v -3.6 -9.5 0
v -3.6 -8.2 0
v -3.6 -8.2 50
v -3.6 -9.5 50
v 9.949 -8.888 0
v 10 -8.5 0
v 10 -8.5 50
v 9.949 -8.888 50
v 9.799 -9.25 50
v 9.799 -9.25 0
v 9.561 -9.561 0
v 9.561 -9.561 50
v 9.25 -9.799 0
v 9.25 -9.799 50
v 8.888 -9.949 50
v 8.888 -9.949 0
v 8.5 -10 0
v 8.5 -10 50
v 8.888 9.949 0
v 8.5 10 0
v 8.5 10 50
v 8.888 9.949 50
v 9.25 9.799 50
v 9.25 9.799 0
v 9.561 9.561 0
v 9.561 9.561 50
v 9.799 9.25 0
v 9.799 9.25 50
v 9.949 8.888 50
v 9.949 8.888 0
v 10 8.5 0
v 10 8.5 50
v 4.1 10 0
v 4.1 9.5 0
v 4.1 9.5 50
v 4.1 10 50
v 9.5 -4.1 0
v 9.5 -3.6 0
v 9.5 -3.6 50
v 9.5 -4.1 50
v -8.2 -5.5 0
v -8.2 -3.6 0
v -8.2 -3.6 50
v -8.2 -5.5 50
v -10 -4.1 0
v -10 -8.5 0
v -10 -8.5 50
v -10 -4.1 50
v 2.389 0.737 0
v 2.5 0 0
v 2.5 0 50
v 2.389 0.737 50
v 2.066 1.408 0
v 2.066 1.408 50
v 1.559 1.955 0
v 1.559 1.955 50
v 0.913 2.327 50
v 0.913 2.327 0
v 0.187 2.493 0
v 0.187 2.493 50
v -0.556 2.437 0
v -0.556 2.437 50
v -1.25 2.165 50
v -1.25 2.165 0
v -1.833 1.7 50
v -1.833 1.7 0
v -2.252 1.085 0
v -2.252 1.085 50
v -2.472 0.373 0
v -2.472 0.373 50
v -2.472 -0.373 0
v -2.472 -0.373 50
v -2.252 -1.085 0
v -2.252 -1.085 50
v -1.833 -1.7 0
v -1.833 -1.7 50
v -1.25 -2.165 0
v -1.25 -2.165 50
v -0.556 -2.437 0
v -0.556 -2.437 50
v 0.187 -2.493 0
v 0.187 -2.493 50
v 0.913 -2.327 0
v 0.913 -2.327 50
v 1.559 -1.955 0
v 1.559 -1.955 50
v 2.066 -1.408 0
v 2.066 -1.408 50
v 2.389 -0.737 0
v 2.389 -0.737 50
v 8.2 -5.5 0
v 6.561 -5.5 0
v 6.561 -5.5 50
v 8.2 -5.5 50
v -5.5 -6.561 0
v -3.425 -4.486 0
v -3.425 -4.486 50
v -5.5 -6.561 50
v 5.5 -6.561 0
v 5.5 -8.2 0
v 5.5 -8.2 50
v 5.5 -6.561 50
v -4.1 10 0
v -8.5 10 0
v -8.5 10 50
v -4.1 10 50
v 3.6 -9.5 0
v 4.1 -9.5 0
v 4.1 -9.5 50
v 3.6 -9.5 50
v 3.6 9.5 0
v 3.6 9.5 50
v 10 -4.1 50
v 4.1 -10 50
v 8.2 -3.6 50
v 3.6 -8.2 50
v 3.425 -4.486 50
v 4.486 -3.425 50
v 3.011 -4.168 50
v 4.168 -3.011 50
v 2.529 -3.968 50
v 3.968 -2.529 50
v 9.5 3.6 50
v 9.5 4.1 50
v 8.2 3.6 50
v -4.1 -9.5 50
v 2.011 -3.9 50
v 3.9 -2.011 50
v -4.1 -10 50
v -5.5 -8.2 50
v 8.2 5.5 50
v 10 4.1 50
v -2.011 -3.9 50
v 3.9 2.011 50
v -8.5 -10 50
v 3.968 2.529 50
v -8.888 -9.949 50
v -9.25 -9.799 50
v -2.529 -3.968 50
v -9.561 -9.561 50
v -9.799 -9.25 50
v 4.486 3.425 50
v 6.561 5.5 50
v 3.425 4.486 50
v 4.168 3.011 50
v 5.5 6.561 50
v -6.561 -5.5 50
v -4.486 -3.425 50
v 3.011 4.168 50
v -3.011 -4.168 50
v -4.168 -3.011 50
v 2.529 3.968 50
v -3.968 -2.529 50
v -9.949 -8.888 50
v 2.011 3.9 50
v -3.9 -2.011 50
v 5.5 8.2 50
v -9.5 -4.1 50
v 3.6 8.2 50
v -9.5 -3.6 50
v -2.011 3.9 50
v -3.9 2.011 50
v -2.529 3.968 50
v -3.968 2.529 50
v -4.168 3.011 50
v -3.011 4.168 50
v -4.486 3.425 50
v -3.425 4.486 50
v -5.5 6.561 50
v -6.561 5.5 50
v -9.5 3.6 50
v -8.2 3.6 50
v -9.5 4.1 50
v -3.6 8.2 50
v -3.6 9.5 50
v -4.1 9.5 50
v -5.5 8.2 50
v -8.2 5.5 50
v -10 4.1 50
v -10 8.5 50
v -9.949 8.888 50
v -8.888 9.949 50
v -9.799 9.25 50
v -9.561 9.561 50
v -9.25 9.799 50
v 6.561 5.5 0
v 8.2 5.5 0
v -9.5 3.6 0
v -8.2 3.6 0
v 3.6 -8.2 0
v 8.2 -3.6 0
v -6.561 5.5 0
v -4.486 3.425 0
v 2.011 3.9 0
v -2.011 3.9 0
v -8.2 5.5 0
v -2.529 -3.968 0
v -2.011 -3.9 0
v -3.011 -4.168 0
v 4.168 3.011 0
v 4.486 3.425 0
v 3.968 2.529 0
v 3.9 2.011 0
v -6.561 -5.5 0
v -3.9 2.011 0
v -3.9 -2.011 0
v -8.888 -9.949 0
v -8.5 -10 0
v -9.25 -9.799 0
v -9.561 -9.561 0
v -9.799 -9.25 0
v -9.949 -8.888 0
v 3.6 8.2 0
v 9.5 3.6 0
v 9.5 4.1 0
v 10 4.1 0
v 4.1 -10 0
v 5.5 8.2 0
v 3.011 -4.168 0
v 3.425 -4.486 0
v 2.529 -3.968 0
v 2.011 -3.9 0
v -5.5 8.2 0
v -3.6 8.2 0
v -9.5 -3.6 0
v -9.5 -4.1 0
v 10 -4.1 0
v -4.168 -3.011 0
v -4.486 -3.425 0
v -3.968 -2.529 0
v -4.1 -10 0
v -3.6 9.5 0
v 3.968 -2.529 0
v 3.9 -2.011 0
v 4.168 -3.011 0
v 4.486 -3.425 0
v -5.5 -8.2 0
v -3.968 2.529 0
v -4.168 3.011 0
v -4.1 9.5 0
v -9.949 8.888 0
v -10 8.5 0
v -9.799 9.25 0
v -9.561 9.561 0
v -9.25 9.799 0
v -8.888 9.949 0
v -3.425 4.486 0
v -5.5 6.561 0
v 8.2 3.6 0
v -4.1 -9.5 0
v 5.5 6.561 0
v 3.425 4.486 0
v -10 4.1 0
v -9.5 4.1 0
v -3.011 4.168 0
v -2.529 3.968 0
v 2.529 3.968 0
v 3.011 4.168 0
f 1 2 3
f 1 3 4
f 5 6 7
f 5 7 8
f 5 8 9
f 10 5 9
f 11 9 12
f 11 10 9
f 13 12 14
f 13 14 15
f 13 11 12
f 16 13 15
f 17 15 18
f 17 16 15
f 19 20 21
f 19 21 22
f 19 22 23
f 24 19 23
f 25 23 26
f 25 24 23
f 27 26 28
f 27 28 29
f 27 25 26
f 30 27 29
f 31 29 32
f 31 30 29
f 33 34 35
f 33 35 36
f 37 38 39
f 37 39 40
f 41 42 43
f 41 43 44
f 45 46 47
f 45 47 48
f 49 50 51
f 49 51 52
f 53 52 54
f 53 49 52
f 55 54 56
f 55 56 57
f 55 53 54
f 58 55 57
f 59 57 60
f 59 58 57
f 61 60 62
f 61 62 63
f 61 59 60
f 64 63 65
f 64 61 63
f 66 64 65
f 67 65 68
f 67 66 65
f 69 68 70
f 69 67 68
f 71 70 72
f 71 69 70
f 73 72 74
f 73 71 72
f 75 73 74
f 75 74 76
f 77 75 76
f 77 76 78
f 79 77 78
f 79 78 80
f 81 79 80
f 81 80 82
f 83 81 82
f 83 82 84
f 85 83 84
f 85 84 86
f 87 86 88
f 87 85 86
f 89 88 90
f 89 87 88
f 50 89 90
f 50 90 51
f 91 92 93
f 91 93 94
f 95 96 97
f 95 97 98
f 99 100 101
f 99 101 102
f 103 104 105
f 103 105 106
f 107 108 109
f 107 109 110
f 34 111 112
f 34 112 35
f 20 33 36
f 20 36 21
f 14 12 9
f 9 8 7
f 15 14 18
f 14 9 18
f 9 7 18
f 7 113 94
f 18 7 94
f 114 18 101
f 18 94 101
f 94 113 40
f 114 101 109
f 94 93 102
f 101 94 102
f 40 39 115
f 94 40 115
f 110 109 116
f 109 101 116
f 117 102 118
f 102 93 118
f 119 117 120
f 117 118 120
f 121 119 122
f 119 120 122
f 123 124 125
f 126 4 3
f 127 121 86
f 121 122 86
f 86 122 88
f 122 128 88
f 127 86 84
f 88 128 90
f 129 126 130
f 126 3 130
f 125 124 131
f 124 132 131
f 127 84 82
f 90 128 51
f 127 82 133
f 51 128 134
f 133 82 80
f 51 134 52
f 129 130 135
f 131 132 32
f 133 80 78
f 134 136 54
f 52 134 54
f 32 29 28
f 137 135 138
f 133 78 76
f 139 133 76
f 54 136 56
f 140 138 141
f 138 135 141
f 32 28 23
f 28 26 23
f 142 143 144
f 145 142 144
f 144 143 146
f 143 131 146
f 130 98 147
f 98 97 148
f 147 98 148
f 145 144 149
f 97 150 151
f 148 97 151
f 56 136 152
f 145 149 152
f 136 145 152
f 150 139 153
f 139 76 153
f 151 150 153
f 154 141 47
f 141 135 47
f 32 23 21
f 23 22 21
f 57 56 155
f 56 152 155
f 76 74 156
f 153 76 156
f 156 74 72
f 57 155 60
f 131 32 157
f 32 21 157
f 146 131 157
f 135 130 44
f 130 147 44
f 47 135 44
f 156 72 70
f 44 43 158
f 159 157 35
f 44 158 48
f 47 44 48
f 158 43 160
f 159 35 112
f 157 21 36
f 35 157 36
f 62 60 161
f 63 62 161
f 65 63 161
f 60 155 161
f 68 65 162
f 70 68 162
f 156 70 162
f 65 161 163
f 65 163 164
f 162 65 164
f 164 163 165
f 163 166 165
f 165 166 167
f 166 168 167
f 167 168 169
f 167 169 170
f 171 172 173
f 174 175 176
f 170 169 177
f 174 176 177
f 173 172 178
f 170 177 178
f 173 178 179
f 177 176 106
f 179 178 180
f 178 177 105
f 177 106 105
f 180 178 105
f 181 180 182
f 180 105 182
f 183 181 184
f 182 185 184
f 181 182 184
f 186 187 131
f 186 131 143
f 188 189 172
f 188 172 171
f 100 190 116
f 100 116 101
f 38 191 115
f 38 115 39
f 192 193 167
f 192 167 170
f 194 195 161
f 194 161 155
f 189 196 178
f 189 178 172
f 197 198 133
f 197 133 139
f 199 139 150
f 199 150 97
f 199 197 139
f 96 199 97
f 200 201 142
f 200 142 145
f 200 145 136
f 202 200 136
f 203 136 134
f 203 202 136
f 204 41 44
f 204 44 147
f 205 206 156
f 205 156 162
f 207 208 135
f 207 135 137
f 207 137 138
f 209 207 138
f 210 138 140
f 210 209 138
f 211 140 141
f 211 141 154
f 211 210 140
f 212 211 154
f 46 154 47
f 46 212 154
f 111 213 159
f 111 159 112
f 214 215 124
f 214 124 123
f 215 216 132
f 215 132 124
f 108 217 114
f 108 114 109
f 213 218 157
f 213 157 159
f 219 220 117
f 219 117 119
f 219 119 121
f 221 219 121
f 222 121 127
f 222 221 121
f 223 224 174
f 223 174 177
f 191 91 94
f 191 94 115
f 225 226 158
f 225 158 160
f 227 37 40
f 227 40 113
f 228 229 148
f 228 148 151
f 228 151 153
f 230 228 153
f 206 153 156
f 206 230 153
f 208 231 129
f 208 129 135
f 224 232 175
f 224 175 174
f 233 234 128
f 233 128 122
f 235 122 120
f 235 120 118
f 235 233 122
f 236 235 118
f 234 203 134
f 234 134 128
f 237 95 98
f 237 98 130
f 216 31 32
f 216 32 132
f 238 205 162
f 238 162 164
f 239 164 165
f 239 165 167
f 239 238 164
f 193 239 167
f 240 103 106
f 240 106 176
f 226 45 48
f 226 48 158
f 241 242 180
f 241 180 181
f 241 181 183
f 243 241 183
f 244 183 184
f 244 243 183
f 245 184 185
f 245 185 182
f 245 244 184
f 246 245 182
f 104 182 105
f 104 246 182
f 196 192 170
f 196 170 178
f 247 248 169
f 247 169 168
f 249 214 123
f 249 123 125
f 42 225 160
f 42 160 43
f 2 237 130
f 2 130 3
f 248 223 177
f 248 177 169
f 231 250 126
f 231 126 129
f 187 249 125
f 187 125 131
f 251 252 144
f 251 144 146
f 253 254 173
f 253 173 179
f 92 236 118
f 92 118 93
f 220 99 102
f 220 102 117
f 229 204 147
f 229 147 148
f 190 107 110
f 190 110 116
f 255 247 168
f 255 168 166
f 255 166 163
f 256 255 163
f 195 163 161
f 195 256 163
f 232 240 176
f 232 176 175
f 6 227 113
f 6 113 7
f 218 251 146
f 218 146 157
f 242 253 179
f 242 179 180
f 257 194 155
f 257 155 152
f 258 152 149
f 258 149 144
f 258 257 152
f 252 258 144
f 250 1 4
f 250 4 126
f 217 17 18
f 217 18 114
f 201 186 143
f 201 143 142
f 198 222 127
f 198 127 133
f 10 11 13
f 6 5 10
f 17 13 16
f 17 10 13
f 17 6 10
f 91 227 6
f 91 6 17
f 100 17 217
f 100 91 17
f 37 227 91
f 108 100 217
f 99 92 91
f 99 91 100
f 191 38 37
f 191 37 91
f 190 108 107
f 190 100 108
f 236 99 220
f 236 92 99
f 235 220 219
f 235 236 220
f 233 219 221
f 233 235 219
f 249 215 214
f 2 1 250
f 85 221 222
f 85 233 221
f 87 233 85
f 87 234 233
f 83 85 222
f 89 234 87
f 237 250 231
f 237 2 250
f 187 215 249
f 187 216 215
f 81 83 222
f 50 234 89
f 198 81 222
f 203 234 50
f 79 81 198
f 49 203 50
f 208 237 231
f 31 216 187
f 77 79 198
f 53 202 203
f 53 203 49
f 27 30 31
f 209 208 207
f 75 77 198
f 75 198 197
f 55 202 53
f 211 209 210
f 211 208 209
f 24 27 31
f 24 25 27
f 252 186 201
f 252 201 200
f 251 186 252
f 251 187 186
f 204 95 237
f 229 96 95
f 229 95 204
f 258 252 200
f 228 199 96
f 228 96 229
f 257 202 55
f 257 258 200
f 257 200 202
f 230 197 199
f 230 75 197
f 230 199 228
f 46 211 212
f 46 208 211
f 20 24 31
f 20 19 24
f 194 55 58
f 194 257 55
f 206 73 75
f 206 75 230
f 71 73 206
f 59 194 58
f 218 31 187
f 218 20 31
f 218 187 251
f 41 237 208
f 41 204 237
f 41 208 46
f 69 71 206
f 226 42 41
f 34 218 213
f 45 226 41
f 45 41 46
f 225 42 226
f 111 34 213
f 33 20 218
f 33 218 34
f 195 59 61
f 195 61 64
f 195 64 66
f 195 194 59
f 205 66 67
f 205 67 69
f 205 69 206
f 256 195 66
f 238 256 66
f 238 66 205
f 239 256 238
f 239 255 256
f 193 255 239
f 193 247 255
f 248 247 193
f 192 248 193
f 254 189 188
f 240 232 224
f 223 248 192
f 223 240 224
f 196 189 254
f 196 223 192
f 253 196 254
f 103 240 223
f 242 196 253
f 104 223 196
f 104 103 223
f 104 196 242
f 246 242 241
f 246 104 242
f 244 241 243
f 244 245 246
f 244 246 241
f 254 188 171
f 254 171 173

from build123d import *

# Parameters (mm, degrees)
SKETCH1_R           = 2.5
BOSS_EXTRUDE2_DEPTH = 50


with BuildPart() as part:
    # Sketch1 → Boss-Extrude2 (new body)
    with BuildSketch(Plane.XY):
        with BuildLine():
            Line((10, -4.1), (10, -8.5))
            ThreePointArc((10, -8.5), (9.560660172, -9.560660172), (8.5, -10))
            Line((8.5, -10), (4.1, -10))
            Line((4.1, -10), (4.1, -9.5))
            Line((4.1, -9.5), (3.6, -9.5))
            Line((3.6, -9.5), (3.6, -8.2))
            Line((3.6, -8.2), (5.5, -8.2))
            Line((5.5, -8.2), (5.5, -6.560660172))
            Line((5.5, -6.560660172), (3.425126266, -4.485786438))
            ThreePointArc((3.425126266, -4.485786438), (2.776279568, -4.052240935), (2.010912703, -3.9))
            Line((2.010912703, -3.9), (-2.010912703, -3.9))
            ThreePointArc((-2.010912703, -3.9), (-2.776279568, -4.052240935), (-3.425126266, -4.485786438))
            Line((-3.425126266, -4.485786438), (-5.5, -6.560660172))
            Line((-5.5, -6.560660172), (-5.5, -8.2))
            Line((-5.5, -8.2), (-3.6, -8.2))
            Line((-3.6, -8.2), (-3.6, -9.5))
            Line((-3.6, -9.5), (-4.1, -9.5))
            Line((-4.1, -9.5), (-4.1, -10))
            Line((-4.1, -10), (-8.5, -10))
            ThreePointArc((-8.5, -10), (-9.560660172, -9.560660172), (-10, -8.5))
            Line((-10, -8.5), (-10, -4.1))
            Line((-10, -4.1), (-9.5, -4.1))
            Line((-9.5, -4.1), (-9.5, -3.6))
            Line((-9.5, -3.6), (-8.2, -3.6))
            Line((-8.2, -3.6), (-8.2, -5.5))
            Line((-8.2, -5.5), (-6.560660172, -5.5))
            Line((-6.560660172, -5.5), (-4.485786438, -3.425126266))
            ThreePointArc((-4.485786438, -3.425126266), (-4.052240935, -2.776279568), (-3.9, -2.010912703))
            Line((-3.9, -2.010912703), (-3.9, 2.010912703))
            ThreePointArc((-3.9, 2.010912703), (-4.052240935, 2.776279568), (-4.485786438, 3.425126266))
            Line((-4.485786438, 3.425126266), (-6.560660172, 5.5))
            Line((-6.560660172, 5.5), (-8.2, 5.5))
            Line((-8.2, 5.5), (-8.2, 3.6))
            Line((-8.2, 3.6), (-9.5, 3.6))
            Line((-9.5, 3.6), (-9.5, 4.1))
            Line((-9.5, 4.1), (-10, 4.1))
            Line((-10, 4.1), (-10, 8.5))
            ThreePointArc((-10, 8.5), (-9.560660172, 9.560660172), (-8.5, 10))
            Line((-8.5, 10), (-4.1, 10))
            Line((-4.1, 10), (-4.1, 9.5))
            Line((-4.1, 9.5), (-3.6, 9.5))
            Line((-3.6, 9.5), (-3.6, 8.2))
            Line((-3.6, 8.2), (-5.5, 8.2))
            Line((-5.5, 8.2), (-5.5, 6.560660172))
            Line((-5.5, 6.560660172), (-3.425126266, 4.485786438))
            ThreePointArc((-3.425126266, 4.485786438), (-2.776279568, 4.052240935), (-2.010912703, 3.9))
            Line((-2.010912703, 3.9), (2.010912703, 3.9))
            ThreePointArc((2.010912703, 3.9), (2.776279568, 4.052240935), (3.425126266, 4.485786438))
            Line((3.425126266, 4.485786438), (5.5, 6.560660172))
            Line((5.5, 6.560660172), (5.5, 8.2))
            Line((5.5, 8.2), (3.6, 8.2))
            Line((3.6, 8.2), (3.6, 9.5))
            Line((3.6, 9.5), (4.1, 9.5))
            Line((4.1, 9.5), (4.1, 10))
            Line((4.1, 10), (8.5, 10))
            ThreePointArc((8.5, 10), (9.560660172, 9.560660172), (10, 8.5))
            Line((10, 8.5), (10, 4.1))
            Line((10, 4.1), (9.5, 4.1))
            Line((9.5, 4.1), (9.5, 3.6))
            Line((9.5, 3.6), (8.2, 3.6))
            Line((8.2, 3.6), (8.2, 5.5))
            Line((8.2, 5.5), (6.560660172, 5.5))
            Line((6.560660172, 5.5), (4.485786438, 3.425126266))
            ThreePointArc((4.485786438, 3.425126266), (4.052240935, 2.776279568), (3.9, 2.010912703))
            Line((3.9, 2.010912703), (3.9, -2.010912703))
            ThreePointArc((3.9, -2.010912703), (4.052240935, -2.776279568), (4.485786438, -3.425126266))
            Line((4.485786438, -3.425126266), (6.560660172, -5.5))
            Line((6.560660172, -5.5), (8.2, -5.5))
            Line((8.2, -5.5), (8.2, -3.6))
            Line((8.2, -3.6), (9.5, -3.6))
            Line((9.5, -3.6), (9.5, -4.1))
            Line((9.5, -4.1), (10, -4.1))
        make_face()
        Circle(SKETCH1_R, mode=Mode.SUBTRACT)
    extrude(amount=BOSS_EXTRUDE2_DEPTH)


solid = part.part
